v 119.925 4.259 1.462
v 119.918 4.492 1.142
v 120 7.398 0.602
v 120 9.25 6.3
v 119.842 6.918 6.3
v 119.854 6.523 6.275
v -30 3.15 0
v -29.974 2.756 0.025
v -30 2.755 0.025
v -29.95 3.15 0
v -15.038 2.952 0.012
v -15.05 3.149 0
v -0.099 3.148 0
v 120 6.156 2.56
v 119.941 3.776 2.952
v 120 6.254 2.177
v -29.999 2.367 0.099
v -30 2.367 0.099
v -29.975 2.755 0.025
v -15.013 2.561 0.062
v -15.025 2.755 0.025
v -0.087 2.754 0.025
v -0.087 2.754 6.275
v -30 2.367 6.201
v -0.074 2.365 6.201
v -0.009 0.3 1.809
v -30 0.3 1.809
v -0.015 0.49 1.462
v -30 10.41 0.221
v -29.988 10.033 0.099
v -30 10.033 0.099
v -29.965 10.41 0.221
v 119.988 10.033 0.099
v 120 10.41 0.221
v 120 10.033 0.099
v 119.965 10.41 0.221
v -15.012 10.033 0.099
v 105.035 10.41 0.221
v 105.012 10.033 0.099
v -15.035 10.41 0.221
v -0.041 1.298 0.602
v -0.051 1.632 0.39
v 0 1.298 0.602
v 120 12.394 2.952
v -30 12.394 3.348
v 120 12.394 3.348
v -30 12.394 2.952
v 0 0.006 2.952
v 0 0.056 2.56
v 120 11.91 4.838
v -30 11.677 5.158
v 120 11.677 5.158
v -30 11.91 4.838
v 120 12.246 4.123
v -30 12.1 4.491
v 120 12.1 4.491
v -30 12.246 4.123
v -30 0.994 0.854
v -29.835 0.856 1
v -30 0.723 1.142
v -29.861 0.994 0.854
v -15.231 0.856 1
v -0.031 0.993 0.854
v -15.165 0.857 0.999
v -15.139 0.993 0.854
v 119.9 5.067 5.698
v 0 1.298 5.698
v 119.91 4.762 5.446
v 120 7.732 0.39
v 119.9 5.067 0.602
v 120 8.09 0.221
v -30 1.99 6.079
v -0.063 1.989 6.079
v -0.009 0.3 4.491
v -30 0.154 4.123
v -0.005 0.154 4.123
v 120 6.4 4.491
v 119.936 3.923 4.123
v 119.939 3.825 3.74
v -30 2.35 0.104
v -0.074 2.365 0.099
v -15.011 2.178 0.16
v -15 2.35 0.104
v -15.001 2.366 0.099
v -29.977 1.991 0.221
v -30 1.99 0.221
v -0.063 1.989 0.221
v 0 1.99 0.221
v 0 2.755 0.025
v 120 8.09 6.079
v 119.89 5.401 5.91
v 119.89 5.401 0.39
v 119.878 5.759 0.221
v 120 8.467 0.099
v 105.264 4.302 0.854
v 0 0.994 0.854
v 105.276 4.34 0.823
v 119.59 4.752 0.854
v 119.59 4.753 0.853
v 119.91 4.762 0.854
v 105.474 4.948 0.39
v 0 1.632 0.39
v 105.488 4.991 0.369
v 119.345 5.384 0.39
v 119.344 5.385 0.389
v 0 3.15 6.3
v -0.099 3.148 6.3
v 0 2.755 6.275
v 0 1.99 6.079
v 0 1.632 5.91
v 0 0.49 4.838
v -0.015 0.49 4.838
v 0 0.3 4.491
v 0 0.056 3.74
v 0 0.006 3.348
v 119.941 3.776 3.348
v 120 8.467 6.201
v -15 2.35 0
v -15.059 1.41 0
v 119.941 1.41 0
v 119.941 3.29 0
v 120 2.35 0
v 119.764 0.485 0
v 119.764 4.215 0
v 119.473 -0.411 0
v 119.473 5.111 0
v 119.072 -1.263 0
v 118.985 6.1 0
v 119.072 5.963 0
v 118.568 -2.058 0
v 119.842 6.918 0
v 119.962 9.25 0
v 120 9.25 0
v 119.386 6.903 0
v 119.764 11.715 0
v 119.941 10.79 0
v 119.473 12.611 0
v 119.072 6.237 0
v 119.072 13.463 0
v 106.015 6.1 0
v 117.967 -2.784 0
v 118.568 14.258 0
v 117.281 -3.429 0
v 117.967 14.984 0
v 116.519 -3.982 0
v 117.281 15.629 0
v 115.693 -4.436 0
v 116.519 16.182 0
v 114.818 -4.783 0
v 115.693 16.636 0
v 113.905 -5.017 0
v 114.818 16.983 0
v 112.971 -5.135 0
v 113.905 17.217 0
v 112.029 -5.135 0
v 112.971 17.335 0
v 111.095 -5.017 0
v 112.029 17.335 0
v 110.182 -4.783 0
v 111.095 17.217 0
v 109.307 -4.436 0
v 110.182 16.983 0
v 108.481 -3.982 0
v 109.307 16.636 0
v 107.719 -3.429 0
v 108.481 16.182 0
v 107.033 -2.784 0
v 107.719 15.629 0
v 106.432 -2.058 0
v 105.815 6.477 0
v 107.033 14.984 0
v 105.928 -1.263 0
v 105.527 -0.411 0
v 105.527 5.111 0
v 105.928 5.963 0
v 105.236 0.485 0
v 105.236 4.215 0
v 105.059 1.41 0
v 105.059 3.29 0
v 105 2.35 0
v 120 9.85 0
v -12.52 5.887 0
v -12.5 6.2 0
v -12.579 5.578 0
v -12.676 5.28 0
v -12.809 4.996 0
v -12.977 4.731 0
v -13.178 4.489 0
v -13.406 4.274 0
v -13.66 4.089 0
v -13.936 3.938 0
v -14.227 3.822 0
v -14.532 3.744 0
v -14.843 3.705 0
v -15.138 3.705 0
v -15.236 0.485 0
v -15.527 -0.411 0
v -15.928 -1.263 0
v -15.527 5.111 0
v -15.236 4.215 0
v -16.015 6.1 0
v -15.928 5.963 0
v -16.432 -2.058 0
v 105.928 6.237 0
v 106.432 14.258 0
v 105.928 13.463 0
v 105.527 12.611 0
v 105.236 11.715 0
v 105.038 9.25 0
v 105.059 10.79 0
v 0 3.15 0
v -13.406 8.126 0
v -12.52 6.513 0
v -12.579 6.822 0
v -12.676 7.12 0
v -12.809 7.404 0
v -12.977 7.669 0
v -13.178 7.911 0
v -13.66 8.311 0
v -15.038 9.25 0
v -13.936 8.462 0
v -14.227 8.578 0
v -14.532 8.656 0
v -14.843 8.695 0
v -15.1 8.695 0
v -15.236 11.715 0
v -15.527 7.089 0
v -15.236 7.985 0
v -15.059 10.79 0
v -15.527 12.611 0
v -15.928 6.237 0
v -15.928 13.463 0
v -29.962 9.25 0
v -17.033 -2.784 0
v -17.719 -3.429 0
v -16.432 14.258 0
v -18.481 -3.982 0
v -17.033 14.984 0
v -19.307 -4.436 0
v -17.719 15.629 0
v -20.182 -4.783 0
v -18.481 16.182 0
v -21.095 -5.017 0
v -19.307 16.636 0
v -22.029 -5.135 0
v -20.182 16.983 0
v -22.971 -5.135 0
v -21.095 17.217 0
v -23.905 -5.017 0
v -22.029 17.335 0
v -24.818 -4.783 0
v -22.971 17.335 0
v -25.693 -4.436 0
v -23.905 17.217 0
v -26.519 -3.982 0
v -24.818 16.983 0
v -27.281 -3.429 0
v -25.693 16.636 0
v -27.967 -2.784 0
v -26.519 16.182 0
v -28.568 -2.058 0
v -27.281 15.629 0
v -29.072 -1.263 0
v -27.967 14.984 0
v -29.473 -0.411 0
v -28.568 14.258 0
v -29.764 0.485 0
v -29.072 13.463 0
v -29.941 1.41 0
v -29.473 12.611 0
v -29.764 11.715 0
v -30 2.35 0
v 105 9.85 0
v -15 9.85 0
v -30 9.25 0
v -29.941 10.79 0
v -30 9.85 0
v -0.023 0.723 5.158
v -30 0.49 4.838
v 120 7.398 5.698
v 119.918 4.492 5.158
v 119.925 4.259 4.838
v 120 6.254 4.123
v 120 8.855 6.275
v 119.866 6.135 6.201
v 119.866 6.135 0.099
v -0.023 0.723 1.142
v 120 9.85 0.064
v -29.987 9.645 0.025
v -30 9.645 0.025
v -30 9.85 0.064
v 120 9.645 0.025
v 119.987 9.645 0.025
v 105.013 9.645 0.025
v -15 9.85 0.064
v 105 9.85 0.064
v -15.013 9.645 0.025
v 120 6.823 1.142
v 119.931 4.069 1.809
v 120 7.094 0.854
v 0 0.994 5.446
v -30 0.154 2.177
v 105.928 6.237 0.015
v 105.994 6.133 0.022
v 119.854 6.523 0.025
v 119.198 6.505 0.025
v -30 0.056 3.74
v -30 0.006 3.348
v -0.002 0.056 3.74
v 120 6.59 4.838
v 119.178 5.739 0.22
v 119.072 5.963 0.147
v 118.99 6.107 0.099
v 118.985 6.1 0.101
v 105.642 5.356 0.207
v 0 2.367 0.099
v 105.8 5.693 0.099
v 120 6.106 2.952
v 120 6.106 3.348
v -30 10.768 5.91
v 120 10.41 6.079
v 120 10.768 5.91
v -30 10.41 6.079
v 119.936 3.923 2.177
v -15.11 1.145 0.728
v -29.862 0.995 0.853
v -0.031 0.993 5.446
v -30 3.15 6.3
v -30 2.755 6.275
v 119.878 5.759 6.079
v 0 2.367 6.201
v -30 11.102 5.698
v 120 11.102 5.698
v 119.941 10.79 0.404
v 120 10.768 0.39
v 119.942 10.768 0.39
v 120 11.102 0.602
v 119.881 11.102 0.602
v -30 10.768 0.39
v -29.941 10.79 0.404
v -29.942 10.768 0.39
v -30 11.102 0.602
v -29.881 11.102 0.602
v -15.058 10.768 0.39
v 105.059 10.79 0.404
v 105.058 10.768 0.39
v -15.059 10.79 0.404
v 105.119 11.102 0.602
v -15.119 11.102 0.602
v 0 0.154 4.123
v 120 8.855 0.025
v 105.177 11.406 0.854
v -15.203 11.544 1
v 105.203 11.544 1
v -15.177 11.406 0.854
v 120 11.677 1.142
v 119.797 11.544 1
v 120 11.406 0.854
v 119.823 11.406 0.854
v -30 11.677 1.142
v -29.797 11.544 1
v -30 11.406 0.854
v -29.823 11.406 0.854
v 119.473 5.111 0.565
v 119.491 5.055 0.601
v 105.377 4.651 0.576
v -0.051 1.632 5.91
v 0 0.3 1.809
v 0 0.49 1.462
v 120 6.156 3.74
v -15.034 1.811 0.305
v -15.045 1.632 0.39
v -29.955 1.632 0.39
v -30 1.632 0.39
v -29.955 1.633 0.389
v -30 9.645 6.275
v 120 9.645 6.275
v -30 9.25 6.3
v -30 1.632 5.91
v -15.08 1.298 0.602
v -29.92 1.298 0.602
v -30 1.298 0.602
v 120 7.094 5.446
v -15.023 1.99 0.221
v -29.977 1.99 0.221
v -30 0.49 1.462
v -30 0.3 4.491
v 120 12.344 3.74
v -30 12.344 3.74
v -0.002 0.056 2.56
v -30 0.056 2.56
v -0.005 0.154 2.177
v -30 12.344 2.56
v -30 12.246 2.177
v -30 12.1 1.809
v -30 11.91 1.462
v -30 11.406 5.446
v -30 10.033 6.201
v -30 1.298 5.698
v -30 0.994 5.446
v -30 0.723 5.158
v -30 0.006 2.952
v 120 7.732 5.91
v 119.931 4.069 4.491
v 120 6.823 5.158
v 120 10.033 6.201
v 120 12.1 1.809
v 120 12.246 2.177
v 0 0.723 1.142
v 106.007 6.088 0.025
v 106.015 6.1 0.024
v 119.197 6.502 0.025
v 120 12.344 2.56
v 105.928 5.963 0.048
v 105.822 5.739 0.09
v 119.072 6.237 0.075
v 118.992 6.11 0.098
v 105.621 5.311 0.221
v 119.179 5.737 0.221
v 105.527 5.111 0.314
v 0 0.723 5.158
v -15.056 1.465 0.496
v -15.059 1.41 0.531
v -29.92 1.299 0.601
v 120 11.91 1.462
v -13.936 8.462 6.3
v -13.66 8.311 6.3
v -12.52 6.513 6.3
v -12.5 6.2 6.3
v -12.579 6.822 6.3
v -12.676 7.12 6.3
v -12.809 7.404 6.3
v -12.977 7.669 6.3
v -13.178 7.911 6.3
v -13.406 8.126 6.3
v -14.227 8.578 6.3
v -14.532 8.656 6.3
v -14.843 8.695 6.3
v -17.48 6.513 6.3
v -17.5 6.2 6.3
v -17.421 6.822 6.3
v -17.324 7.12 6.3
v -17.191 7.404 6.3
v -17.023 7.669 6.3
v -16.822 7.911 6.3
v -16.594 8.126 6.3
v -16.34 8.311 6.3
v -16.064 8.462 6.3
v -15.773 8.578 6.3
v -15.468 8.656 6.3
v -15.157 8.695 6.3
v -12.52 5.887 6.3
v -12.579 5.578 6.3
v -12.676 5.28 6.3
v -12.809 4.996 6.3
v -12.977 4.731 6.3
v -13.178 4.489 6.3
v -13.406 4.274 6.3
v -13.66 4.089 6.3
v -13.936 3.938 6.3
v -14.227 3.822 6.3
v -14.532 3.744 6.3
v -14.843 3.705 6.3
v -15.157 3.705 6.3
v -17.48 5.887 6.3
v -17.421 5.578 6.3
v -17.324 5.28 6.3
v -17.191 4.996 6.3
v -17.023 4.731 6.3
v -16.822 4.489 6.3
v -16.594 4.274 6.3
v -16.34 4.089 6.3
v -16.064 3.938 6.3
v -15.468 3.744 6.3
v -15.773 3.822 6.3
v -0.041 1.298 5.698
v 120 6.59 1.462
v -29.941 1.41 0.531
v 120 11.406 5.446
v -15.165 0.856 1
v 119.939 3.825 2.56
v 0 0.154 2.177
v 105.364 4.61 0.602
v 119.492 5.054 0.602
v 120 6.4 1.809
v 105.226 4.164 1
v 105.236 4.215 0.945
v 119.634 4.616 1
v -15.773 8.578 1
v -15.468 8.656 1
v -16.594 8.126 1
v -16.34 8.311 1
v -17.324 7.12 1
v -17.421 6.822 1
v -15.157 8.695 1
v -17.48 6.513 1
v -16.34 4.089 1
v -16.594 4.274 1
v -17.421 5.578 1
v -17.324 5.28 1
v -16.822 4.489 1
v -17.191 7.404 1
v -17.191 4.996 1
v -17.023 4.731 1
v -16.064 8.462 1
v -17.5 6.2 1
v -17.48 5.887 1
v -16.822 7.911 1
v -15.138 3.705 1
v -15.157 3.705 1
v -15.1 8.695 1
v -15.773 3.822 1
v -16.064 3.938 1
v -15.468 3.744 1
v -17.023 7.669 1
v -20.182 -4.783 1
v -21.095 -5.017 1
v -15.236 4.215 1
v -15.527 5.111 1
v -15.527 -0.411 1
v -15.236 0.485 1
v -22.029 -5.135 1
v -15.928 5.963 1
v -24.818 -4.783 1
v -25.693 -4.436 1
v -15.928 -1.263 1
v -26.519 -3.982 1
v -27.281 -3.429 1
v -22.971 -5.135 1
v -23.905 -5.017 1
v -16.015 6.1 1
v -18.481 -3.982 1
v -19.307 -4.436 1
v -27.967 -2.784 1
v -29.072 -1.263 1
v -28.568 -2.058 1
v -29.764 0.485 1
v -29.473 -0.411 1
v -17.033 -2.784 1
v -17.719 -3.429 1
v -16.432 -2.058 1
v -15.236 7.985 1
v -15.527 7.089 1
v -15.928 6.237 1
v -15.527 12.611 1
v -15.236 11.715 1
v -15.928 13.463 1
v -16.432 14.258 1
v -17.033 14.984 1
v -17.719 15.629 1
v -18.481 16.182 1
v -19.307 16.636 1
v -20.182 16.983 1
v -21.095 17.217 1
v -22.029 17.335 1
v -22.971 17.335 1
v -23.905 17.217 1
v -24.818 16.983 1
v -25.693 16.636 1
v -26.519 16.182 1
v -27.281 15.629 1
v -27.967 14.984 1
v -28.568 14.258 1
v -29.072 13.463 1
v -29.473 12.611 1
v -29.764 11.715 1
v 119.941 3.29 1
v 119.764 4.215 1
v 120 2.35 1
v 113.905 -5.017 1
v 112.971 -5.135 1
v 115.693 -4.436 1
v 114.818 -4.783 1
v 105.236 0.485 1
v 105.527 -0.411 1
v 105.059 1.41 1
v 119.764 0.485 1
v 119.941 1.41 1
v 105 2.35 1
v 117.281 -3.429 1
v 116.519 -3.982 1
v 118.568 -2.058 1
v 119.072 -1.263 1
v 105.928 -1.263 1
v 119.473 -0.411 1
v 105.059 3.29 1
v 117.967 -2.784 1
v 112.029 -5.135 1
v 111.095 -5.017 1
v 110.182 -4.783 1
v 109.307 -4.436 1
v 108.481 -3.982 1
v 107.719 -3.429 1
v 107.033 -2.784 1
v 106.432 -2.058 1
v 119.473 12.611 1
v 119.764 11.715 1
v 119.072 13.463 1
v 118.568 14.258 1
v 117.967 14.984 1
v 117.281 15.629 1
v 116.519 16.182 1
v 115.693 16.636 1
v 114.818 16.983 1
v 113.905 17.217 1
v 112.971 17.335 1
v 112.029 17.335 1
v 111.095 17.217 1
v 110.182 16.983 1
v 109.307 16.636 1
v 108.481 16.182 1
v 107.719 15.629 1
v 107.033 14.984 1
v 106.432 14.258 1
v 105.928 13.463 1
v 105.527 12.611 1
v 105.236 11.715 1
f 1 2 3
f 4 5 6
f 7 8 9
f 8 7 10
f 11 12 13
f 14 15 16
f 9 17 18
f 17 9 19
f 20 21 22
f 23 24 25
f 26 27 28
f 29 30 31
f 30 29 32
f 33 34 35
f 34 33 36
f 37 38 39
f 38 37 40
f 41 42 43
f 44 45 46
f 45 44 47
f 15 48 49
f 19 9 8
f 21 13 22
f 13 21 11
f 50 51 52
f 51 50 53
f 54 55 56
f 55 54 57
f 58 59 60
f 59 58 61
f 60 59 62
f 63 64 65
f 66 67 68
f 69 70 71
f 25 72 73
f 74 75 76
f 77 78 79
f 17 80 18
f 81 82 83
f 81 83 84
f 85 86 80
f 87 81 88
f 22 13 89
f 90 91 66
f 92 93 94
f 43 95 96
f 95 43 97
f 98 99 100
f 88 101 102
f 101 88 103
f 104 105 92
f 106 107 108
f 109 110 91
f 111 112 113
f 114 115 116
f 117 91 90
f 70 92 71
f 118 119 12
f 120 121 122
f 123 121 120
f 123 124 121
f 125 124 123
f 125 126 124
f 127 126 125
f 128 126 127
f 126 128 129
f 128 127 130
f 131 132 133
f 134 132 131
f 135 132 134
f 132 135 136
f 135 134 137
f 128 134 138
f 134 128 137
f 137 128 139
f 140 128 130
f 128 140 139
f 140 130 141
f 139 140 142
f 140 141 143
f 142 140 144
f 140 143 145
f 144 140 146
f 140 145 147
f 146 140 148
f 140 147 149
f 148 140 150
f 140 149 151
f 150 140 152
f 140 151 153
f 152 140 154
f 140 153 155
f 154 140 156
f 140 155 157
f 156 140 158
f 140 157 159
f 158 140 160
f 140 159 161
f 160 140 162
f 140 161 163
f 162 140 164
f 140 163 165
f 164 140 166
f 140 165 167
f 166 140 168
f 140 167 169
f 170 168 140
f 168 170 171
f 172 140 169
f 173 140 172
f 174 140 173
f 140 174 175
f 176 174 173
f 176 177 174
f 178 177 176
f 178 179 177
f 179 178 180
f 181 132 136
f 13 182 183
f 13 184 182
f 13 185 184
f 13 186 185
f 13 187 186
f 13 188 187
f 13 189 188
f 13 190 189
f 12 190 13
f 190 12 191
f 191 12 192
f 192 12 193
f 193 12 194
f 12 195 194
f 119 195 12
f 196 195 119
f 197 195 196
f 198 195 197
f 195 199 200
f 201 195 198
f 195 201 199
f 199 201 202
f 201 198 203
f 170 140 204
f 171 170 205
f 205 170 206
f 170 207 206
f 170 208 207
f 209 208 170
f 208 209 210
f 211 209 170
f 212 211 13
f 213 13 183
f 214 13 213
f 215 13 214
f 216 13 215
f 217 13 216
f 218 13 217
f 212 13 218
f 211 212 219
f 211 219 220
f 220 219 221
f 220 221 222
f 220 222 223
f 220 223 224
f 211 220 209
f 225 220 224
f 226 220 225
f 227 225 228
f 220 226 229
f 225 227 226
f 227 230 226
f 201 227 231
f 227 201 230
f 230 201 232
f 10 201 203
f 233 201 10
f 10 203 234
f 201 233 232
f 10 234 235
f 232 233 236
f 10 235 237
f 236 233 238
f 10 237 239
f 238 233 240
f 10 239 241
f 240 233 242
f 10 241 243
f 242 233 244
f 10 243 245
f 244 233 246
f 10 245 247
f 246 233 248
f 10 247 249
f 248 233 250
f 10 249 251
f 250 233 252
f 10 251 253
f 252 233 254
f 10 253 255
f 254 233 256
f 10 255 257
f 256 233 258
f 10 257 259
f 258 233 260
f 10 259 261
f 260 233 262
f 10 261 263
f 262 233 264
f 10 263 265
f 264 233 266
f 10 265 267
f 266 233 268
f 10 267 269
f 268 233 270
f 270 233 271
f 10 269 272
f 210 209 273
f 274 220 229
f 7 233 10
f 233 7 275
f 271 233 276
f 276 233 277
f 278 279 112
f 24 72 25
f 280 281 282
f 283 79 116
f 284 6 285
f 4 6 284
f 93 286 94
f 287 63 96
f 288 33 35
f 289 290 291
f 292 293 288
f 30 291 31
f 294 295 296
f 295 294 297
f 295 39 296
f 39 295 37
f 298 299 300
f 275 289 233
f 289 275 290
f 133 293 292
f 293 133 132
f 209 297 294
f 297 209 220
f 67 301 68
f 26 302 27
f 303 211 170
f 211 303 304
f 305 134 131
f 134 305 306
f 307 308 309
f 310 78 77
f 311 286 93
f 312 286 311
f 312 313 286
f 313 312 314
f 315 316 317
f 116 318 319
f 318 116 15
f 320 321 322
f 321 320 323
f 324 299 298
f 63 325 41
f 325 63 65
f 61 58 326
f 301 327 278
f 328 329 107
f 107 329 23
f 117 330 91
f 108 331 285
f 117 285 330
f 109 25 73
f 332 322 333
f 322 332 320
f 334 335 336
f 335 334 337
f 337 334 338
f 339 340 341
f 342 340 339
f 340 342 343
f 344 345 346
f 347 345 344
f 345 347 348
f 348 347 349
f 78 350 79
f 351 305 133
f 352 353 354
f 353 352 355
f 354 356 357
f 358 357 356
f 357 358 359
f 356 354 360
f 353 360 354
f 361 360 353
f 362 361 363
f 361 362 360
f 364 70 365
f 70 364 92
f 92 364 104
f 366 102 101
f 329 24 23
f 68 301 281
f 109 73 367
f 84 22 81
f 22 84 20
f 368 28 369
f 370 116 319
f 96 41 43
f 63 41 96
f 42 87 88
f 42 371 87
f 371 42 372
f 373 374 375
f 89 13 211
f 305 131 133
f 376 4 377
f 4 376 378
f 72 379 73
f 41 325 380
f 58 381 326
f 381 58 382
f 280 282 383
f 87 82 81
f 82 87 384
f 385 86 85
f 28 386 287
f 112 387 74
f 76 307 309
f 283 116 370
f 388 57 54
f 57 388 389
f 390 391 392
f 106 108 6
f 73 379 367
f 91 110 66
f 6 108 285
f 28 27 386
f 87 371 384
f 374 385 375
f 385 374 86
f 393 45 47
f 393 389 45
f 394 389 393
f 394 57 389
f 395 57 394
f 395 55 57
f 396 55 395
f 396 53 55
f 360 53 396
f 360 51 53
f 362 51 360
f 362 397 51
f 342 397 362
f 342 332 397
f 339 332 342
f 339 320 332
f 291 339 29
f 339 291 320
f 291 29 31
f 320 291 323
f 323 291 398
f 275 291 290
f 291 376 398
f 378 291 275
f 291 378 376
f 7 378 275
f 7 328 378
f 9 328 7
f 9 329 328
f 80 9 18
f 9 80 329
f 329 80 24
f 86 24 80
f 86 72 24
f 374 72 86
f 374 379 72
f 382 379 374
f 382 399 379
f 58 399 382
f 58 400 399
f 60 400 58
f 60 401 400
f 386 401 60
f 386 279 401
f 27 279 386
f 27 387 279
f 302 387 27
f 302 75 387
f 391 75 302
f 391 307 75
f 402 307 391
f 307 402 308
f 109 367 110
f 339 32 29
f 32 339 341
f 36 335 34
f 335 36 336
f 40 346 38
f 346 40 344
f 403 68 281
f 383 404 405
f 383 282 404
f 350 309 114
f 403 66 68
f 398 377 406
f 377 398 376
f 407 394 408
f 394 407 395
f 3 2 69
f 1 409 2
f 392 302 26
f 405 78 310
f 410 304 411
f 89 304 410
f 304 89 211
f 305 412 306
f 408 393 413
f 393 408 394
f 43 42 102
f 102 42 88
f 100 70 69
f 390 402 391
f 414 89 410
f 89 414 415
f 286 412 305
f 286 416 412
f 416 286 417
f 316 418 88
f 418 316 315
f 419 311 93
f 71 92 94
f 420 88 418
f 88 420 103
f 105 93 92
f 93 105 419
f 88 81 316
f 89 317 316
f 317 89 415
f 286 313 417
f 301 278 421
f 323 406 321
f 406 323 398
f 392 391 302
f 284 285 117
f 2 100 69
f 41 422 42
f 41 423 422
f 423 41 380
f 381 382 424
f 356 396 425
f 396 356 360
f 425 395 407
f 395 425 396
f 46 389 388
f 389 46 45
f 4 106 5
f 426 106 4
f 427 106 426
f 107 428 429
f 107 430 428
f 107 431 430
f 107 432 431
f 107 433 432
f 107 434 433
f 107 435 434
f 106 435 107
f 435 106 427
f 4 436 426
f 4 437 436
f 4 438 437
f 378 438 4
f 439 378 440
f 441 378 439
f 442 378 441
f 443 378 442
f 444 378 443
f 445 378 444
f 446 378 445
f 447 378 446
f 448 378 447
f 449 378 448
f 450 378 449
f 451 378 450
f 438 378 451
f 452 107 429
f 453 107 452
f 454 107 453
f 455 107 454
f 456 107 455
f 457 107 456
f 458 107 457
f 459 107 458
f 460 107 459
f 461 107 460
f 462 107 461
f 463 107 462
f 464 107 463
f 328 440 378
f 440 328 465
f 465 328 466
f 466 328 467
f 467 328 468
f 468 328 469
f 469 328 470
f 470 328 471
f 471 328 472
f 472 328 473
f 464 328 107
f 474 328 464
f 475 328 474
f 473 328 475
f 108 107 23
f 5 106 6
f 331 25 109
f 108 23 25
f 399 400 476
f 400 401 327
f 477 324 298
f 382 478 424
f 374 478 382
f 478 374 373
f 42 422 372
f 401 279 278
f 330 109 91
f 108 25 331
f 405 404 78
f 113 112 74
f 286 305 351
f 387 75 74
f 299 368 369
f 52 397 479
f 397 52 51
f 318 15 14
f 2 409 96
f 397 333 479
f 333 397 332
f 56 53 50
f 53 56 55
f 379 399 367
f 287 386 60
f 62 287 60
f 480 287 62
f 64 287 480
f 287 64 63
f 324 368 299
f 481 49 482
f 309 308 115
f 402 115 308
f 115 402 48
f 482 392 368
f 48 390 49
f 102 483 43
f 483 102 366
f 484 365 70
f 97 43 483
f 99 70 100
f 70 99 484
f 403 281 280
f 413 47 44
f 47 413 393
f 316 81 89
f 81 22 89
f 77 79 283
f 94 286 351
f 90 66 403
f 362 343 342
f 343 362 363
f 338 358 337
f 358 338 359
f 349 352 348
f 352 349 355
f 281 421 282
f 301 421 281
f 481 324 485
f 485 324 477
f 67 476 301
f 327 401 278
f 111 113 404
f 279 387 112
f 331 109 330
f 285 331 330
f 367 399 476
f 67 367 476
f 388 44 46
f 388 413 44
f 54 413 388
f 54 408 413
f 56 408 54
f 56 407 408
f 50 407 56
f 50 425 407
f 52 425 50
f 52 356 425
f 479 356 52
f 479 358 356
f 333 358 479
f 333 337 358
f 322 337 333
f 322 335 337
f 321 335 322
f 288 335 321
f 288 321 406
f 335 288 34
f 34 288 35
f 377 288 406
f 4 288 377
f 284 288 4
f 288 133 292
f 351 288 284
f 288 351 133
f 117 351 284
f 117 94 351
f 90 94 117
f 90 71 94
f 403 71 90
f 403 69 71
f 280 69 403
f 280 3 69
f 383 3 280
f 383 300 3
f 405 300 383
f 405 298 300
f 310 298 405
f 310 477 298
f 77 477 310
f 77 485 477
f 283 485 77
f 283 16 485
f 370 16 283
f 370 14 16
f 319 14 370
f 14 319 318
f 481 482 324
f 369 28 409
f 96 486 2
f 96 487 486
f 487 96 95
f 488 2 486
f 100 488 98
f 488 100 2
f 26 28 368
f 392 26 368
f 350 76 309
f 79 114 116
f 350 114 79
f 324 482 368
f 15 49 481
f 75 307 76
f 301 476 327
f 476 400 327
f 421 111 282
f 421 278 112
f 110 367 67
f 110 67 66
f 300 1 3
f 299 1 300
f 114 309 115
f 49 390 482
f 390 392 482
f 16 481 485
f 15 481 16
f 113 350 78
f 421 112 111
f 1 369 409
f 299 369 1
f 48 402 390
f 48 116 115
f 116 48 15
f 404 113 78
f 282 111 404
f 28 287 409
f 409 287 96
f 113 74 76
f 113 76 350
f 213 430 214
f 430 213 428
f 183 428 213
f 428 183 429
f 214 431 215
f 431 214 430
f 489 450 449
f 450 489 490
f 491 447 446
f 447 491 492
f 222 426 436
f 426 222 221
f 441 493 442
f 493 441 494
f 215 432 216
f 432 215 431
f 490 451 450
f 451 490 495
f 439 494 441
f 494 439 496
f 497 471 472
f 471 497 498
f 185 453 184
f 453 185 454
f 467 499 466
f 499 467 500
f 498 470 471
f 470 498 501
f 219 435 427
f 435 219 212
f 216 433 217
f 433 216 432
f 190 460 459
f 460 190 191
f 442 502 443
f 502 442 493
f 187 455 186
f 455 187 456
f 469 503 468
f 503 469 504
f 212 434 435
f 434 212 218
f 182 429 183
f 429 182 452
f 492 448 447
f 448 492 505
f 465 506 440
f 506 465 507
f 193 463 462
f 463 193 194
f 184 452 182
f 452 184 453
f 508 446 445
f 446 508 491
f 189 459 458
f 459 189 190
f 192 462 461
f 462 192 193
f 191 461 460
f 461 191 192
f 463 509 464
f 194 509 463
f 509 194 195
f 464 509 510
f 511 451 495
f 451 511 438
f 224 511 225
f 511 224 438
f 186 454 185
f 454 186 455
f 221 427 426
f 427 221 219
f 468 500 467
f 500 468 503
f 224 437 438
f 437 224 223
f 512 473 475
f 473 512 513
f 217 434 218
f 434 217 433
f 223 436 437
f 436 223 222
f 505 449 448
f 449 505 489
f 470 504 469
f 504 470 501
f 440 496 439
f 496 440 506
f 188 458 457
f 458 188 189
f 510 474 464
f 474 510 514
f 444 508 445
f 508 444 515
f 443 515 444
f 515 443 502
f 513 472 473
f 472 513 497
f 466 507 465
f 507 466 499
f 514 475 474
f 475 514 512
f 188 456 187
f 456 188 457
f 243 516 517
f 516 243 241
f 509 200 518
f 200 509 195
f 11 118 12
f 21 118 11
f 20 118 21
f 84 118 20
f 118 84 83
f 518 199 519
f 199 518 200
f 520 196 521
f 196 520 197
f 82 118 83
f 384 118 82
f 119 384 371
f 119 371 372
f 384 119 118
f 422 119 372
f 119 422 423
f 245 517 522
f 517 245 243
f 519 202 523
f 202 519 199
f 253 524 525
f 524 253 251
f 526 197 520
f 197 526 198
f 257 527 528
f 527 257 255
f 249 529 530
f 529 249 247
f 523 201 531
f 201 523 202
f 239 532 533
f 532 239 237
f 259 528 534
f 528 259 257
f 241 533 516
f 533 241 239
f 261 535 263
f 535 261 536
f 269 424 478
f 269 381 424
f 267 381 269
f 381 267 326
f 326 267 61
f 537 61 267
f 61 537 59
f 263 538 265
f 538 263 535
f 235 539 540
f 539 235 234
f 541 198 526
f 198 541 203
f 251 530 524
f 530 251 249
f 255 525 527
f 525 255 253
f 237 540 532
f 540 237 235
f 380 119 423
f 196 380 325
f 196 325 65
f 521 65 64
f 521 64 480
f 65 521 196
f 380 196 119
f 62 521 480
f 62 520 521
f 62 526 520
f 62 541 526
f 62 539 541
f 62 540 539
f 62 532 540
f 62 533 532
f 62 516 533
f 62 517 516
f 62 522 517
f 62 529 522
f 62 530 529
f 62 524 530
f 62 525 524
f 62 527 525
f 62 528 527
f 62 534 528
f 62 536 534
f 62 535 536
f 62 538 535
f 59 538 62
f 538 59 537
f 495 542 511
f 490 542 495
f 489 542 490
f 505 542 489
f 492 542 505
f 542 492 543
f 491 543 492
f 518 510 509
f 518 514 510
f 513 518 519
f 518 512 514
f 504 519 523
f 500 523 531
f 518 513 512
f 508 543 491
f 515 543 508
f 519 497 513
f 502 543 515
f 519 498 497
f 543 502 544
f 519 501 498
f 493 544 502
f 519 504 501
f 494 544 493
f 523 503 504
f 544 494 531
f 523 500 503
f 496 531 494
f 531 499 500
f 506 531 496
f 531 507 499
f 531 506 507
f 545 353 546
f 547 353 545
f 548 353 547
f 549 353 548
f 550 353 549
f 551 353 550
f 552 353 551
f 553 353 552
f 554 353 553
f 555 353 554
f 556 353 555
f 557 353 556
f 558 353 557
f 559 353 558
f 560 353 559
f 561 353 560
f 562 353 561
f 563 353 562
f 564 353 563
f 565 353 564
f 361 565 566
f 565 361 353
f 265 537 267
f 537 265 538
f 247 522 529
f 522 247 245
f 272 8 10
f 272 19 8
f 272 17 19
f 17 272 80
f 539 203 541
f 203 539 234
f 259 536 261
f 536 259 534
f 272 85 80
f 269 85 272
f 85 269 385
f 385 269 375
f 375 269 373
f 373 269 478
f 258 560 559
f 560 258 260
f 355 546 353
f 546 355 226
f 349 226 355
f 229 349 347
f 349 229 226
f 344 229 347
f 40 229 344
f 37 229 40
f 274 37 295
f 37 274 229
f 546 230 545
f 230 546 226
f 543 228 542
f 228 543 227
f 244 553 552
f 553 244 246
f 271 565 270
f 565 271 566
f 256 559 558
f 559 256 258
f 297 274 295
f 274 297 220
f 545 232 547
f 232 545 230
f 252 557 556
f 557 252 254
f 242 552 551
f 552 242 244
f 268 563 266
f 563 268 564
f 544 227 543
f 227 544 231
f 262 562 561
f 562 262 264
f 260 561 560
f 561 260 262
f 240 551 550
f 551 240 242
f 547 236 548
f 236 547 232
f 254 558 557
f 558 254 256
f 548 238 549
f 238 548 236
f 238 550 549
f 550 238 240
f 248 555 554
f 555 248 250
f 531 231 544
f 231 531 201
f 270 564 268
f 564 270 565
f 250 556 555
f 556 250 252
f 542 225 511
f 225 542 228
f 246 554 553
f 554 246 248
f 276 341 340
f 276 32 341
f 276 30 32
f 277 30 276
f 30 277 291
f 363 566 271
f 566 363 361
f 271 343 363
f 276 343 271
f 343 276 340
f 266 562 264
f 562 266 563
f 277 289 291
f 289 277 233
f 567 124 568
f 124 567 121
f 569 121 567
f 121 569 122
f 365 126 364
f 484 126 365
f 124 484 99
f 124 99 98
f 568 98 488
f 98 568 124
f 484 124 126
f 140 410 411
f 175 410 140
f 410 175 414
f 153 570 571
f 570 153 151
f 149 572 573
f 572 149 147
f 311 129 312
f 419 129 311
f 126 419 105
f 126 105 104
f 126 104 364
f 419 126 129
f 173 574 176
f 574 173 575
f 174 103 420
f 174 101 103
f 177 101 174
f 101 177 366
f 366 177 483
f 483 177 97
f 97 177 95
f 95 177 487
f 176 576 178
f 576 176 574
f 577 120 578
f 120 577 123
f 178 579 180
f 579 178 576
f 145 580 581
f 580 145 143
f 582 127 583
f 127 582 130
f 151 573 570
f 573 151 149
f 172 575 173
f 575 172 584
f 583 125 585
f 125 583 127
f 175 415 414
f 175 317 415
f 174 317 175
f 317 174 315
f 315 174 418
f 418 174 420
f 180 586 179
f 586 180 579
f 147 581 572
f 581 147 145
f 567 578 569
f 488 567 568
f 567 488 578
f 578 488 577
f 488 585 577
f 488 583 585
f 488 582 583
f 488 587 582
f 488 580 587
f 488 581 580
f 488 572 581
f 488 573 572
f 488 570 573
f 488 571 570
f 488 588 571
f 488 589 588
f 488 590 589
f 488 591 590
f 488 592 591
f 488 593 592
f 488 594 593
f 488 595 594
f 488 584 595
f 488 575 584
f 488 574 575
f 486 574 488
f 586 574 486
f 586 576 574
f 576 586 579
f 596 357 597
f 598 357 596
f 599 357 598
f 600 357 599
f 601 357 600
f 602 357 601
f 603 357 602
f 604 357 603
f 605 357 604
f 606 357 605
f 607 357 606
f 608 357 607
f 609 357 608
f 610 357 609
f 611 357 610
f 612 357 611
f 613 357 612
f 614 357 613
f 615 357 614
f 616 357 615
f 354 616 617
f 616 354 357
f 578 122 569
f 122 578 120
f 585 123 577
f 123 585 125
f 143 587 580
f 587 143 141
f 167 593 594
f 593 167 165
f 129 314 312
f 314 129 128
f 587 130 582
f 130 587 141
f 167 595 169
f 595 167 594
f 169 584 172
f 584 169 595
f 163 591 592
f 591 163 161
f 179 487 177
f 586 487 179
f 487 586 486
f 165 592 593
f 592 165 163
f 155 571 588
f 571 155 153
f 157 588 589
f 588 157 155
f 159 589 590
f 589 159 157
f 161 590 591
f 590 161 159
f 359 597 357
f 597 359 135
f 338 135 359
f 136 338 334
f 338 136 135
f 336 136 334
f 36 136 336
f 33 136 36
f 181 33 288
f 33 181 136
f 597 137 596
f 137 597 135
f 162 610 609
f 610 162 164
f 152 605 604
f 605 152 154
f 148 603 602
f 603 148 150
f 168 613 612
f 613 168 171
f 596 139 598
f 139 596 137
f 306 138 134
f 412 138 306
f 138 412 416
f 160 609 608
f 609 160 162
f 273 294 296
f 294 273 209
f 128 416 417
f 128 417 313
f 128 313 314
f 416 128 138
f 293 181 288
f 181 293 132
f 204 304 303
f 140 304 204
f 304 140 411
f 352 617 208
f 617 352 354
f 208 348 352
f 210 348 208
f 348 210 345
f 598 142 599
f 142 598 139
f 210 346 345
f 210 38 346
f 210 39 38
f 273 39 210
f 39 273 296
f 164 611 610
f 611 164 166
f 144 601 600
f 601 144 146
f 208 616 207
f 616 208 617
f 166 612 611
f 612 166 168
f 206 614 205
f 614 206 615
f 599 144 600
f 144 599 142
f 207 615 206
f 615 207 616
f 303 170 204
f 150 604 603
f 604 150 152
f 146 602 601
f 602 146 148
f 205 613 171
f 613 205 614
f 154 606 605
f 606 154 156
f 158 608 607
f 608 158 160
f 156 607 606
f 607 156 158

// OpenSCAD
////////////////////////////////////////////////
///////wedge for removing MT tapers//////
/*author:Rudiger Vanden Driessche
ruudoleo@skynet.be
date:10/09/2015
ABS   print with 100% innfill

about tapers:
http://www.beautifuliron.com/mttaper.htm
Had to replace the head of my drilling machine, but the taper was lodged after 20 years nonuse. 
*/
/*//parameters//////*/
/* [Wedge]*/
Wedgelenght=150;
Wedgeshaft=30;
Wedgewidth=6.3;//[5.2:MT1,6.3:MT2,7.9:MT3,11.9:MT4,15.9:MT5]
Rounding=true;
Hole=5;
taperw=10;
lenghtpercent=50;
slopepercent=4;
/* [Antiwarpears]*/
eardia=15;
earh=1;
/* [Hidden]*/
safety=0.1;

space=taperw-Wedgewidth;
slope=Wedgelenght-Wedgeshaft;
a1=space-(lenghtpercent/100*slope*slopepercent/100);
a2=space+(1-lenghtpercent/100)*slope*slopepercent/100;
angle=slopepercent/100*45;
echo(a1,a2);

difference(){
hull(){
    
    //shaft
    translate([0,Wedgewidth/2,Wedgewidth/2]){
rotate(-90,[0,1,0]){
cylinder(d=Wedgewidth,h=Wedgeshaft,$fn=50);
}//end rotate
}//end translate


//straight end
translate([slope,Wedgewidth/2+a2,Wedgewidth/2]){
rotate(-90,[0,1,0]){
cylinder(d=Wedgewidth,h=Wedgeshaft+slope,$fn=50);
 }//end rotate
}//end translate 
//sloped end
rotate(angle,[0,0,1]){
translate([0,Wedgewidth/2,Wedgewidth/2]){
    rotate(90,[0,1,0]){
      cylinder(d=Wedgewidth,h=slope,,$fn=50);
    }//end rotate
    }//end translate
}//end rotate

}//end hull
//bore
translate([-Wedgeshaft/2,Wedgewidth/2+a2/2,-safety/2])
    cylinder(d=Hole,h=Wedgewidth+safety,$fn=50);
}//end difference
//ears
translate([0.5*Wedgelenght-Wedgeshaft,a2,0.5*earh]) {
  antiwarpears(eardia,earh,Wedgelenght-eardia,0.5*eardia);

}//end translate
module antiwarpears(dia,h,xd,yd){
	for(x=[-1,1], y=[-1,1]) 
       {
		translate([xd/2*x,yd/2*y,0]) 
            cylinder(d=dia,h=1,center=true,$fn=50);
       }//end for
   }//end module
